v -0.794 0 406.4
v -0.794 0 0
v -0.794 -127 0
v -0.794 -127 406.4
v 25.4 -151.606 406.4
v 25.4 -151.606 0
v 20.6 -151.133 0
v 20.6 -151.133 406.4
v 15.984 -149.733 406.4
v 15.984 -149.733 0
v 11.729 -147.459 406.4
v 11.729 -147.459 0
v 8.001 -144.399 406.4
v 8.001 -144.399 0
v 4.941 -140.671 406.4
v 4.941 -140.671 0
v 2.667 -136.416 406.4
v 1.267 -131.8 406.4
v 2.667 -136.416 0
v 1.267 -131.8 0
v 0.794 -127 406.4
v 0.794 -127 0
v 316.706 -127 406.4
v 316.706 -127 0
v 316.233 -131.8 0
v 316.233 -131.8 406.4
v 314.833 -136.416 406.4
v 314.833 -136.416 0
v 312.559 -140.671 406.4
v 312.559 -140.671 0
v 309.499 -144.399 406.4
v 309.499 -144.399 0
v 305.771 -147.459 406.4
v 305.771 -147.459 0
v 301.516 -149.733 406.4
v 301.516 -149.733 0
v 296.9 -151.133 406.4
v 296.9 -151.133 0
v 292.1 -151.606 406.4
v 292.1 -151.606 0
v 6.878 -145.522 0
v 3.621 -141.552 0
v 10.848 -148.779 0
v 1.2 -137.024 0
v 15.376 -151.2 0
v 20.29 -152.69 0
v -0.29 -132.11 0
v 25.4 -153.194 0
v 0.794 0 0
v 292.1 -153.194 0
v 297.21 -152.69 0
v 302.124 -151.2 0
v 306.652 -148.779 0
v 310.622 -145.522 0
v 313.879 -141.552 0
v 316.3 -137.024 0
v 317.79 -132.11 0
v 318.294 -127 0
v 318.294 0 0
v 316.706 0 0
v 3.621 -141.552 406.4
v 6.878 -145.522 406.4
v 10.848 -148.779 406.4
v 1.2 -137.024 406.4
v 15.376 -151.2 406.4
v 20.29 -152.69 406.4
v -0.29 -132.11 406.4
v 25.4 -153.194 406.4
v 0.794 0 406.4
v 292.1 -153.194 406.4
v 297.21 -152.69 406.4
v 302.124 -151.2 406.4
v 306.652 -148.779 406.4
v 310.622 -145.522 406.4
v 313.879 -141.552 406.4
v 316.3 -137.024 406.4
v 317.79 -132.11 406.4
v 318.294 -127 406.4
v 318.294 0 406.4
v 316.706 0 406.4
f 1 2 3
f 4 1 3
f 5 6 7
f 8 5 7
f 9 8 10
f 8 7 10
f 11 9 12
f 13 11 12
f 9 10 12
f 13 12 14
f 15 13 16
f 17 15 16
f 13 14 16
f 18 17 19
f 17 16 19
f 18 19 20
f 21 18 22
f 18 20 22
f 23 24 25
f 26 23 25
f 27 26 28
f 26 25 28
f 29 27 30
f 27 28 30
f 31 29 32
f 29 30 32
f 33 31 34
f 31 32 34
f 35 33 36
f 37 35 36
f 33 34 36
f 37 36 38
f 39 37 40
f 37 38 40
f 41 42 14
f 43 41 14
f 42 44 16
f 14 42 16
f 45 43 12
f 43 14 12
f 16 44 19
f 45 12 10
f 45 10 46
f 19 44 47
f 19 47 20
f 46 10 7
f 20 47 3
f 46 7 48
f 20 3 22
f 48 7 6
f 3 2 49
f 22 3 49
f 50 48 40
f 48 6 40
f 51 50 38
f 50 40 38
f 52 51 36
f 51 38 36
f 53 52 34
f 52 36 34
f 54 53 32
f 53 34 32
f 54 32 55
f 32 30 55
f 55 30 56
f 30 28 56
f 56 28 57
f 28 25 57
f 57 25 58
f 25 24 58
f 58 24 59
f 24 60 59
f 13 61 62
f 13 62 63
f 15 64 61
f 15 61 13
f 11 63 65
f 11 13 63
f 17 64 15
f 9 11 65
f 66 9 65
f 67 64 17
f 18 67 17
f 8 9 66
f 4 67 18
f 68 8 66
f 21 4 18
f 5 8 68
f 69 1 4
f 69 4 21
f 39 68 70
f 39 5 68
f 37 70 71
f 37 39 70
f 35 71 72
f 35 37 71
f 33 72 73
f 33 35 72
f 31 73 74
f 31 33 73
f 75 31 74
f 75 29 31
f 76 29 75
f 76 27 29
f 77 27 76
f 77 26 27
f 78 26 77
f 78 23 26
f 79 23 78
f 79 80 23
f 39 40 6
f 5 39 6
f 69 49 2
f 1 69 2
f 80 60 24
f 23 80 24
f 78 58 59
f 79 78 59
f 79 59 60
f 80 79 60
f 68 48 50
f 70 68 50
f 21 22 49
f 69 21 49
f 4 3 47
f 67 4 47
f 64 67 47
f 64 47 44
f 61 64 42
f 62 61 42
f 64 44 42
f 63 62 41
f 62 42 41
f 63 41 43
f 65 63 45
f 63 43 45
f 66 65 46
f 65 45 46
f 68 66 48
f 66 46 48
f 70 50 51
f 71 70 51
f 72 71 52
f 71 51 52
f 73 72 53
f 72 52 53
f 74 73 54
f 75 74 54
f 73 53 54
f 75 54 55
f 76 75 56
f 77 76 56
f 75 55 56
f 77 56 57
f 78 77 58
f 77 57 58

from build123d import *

# Parameters (mm, degrees)
BOSS_EXTRUDE1_DEPTH = 406.4


with BuildPart() as part:
    # Sketch1 → Boss-Extrude1 (new body)
    with BuildSketch(Plane.XY):
        with BuildLine():
            Line((0.79375, 0), (0, 0))
            Line((0, 0), (0, -127))
            ThreePointArc((0, -127), (7.439487758, -144.960512242), (25.4, -152.4))
            Line((25.4, -152.4), (292.1, -152.4))
            ThreePointArc((292.1, -152.4), (310.060512242, -144.960512242), (317.5, -127))
            Line((317.5, -127), (317.5, 0))
            Line((317.5, 0), (316.70625, 0))
            Line((316.70625, 0), (316.70625, -127))
            ThreePointArc((316.70625, -127), (309.499246235, -144.399246235), (292.1, -151.60625))
            Line((292.1, -151.60625), (25.4, -151.60625))
            ThreePointArc((25.4, -151.60625), (8.000753765, -144.399246235), (0.79375, -127))
            Line((0.79375, -127), (0.79375, 0))
        make_face()
        with BuildLine():
            Line((0, -127), (0, 0))
            Line((0, 0), (-0.79375, 0))
            Line((-0.79375, 0), (-0.79375, -127))
            ThreePointArc((-0.79375, -127), (6.87822175, -145.52177825), (25.4, -153.19375))
            Line((25.4, -153.19375), (292.1, -153.19375))
            ThreePointArc((292.1, -153.19375), (310.62177825, -145.52177825), (318.29375, -127))
            Line((318.29375, -127), (318.29375, 0))
            Line((318.29375, 0), (317.5, 0))
            Line((317.5, 0), (317.5, -127))
            ThreePointArc((317.5, -127), (310.060512242, -144.960512242), (292.1, -152.4))
            Line((292.1, -152.4), (25.4, -152.4))
            ThreePointArc((25.4, -152.4), (7.439487758, -144.960512242), (0, -127))
        make_face()
    extrude(amount=BOSS_EXTRUDE1_DEPTH)


solid = part.part
